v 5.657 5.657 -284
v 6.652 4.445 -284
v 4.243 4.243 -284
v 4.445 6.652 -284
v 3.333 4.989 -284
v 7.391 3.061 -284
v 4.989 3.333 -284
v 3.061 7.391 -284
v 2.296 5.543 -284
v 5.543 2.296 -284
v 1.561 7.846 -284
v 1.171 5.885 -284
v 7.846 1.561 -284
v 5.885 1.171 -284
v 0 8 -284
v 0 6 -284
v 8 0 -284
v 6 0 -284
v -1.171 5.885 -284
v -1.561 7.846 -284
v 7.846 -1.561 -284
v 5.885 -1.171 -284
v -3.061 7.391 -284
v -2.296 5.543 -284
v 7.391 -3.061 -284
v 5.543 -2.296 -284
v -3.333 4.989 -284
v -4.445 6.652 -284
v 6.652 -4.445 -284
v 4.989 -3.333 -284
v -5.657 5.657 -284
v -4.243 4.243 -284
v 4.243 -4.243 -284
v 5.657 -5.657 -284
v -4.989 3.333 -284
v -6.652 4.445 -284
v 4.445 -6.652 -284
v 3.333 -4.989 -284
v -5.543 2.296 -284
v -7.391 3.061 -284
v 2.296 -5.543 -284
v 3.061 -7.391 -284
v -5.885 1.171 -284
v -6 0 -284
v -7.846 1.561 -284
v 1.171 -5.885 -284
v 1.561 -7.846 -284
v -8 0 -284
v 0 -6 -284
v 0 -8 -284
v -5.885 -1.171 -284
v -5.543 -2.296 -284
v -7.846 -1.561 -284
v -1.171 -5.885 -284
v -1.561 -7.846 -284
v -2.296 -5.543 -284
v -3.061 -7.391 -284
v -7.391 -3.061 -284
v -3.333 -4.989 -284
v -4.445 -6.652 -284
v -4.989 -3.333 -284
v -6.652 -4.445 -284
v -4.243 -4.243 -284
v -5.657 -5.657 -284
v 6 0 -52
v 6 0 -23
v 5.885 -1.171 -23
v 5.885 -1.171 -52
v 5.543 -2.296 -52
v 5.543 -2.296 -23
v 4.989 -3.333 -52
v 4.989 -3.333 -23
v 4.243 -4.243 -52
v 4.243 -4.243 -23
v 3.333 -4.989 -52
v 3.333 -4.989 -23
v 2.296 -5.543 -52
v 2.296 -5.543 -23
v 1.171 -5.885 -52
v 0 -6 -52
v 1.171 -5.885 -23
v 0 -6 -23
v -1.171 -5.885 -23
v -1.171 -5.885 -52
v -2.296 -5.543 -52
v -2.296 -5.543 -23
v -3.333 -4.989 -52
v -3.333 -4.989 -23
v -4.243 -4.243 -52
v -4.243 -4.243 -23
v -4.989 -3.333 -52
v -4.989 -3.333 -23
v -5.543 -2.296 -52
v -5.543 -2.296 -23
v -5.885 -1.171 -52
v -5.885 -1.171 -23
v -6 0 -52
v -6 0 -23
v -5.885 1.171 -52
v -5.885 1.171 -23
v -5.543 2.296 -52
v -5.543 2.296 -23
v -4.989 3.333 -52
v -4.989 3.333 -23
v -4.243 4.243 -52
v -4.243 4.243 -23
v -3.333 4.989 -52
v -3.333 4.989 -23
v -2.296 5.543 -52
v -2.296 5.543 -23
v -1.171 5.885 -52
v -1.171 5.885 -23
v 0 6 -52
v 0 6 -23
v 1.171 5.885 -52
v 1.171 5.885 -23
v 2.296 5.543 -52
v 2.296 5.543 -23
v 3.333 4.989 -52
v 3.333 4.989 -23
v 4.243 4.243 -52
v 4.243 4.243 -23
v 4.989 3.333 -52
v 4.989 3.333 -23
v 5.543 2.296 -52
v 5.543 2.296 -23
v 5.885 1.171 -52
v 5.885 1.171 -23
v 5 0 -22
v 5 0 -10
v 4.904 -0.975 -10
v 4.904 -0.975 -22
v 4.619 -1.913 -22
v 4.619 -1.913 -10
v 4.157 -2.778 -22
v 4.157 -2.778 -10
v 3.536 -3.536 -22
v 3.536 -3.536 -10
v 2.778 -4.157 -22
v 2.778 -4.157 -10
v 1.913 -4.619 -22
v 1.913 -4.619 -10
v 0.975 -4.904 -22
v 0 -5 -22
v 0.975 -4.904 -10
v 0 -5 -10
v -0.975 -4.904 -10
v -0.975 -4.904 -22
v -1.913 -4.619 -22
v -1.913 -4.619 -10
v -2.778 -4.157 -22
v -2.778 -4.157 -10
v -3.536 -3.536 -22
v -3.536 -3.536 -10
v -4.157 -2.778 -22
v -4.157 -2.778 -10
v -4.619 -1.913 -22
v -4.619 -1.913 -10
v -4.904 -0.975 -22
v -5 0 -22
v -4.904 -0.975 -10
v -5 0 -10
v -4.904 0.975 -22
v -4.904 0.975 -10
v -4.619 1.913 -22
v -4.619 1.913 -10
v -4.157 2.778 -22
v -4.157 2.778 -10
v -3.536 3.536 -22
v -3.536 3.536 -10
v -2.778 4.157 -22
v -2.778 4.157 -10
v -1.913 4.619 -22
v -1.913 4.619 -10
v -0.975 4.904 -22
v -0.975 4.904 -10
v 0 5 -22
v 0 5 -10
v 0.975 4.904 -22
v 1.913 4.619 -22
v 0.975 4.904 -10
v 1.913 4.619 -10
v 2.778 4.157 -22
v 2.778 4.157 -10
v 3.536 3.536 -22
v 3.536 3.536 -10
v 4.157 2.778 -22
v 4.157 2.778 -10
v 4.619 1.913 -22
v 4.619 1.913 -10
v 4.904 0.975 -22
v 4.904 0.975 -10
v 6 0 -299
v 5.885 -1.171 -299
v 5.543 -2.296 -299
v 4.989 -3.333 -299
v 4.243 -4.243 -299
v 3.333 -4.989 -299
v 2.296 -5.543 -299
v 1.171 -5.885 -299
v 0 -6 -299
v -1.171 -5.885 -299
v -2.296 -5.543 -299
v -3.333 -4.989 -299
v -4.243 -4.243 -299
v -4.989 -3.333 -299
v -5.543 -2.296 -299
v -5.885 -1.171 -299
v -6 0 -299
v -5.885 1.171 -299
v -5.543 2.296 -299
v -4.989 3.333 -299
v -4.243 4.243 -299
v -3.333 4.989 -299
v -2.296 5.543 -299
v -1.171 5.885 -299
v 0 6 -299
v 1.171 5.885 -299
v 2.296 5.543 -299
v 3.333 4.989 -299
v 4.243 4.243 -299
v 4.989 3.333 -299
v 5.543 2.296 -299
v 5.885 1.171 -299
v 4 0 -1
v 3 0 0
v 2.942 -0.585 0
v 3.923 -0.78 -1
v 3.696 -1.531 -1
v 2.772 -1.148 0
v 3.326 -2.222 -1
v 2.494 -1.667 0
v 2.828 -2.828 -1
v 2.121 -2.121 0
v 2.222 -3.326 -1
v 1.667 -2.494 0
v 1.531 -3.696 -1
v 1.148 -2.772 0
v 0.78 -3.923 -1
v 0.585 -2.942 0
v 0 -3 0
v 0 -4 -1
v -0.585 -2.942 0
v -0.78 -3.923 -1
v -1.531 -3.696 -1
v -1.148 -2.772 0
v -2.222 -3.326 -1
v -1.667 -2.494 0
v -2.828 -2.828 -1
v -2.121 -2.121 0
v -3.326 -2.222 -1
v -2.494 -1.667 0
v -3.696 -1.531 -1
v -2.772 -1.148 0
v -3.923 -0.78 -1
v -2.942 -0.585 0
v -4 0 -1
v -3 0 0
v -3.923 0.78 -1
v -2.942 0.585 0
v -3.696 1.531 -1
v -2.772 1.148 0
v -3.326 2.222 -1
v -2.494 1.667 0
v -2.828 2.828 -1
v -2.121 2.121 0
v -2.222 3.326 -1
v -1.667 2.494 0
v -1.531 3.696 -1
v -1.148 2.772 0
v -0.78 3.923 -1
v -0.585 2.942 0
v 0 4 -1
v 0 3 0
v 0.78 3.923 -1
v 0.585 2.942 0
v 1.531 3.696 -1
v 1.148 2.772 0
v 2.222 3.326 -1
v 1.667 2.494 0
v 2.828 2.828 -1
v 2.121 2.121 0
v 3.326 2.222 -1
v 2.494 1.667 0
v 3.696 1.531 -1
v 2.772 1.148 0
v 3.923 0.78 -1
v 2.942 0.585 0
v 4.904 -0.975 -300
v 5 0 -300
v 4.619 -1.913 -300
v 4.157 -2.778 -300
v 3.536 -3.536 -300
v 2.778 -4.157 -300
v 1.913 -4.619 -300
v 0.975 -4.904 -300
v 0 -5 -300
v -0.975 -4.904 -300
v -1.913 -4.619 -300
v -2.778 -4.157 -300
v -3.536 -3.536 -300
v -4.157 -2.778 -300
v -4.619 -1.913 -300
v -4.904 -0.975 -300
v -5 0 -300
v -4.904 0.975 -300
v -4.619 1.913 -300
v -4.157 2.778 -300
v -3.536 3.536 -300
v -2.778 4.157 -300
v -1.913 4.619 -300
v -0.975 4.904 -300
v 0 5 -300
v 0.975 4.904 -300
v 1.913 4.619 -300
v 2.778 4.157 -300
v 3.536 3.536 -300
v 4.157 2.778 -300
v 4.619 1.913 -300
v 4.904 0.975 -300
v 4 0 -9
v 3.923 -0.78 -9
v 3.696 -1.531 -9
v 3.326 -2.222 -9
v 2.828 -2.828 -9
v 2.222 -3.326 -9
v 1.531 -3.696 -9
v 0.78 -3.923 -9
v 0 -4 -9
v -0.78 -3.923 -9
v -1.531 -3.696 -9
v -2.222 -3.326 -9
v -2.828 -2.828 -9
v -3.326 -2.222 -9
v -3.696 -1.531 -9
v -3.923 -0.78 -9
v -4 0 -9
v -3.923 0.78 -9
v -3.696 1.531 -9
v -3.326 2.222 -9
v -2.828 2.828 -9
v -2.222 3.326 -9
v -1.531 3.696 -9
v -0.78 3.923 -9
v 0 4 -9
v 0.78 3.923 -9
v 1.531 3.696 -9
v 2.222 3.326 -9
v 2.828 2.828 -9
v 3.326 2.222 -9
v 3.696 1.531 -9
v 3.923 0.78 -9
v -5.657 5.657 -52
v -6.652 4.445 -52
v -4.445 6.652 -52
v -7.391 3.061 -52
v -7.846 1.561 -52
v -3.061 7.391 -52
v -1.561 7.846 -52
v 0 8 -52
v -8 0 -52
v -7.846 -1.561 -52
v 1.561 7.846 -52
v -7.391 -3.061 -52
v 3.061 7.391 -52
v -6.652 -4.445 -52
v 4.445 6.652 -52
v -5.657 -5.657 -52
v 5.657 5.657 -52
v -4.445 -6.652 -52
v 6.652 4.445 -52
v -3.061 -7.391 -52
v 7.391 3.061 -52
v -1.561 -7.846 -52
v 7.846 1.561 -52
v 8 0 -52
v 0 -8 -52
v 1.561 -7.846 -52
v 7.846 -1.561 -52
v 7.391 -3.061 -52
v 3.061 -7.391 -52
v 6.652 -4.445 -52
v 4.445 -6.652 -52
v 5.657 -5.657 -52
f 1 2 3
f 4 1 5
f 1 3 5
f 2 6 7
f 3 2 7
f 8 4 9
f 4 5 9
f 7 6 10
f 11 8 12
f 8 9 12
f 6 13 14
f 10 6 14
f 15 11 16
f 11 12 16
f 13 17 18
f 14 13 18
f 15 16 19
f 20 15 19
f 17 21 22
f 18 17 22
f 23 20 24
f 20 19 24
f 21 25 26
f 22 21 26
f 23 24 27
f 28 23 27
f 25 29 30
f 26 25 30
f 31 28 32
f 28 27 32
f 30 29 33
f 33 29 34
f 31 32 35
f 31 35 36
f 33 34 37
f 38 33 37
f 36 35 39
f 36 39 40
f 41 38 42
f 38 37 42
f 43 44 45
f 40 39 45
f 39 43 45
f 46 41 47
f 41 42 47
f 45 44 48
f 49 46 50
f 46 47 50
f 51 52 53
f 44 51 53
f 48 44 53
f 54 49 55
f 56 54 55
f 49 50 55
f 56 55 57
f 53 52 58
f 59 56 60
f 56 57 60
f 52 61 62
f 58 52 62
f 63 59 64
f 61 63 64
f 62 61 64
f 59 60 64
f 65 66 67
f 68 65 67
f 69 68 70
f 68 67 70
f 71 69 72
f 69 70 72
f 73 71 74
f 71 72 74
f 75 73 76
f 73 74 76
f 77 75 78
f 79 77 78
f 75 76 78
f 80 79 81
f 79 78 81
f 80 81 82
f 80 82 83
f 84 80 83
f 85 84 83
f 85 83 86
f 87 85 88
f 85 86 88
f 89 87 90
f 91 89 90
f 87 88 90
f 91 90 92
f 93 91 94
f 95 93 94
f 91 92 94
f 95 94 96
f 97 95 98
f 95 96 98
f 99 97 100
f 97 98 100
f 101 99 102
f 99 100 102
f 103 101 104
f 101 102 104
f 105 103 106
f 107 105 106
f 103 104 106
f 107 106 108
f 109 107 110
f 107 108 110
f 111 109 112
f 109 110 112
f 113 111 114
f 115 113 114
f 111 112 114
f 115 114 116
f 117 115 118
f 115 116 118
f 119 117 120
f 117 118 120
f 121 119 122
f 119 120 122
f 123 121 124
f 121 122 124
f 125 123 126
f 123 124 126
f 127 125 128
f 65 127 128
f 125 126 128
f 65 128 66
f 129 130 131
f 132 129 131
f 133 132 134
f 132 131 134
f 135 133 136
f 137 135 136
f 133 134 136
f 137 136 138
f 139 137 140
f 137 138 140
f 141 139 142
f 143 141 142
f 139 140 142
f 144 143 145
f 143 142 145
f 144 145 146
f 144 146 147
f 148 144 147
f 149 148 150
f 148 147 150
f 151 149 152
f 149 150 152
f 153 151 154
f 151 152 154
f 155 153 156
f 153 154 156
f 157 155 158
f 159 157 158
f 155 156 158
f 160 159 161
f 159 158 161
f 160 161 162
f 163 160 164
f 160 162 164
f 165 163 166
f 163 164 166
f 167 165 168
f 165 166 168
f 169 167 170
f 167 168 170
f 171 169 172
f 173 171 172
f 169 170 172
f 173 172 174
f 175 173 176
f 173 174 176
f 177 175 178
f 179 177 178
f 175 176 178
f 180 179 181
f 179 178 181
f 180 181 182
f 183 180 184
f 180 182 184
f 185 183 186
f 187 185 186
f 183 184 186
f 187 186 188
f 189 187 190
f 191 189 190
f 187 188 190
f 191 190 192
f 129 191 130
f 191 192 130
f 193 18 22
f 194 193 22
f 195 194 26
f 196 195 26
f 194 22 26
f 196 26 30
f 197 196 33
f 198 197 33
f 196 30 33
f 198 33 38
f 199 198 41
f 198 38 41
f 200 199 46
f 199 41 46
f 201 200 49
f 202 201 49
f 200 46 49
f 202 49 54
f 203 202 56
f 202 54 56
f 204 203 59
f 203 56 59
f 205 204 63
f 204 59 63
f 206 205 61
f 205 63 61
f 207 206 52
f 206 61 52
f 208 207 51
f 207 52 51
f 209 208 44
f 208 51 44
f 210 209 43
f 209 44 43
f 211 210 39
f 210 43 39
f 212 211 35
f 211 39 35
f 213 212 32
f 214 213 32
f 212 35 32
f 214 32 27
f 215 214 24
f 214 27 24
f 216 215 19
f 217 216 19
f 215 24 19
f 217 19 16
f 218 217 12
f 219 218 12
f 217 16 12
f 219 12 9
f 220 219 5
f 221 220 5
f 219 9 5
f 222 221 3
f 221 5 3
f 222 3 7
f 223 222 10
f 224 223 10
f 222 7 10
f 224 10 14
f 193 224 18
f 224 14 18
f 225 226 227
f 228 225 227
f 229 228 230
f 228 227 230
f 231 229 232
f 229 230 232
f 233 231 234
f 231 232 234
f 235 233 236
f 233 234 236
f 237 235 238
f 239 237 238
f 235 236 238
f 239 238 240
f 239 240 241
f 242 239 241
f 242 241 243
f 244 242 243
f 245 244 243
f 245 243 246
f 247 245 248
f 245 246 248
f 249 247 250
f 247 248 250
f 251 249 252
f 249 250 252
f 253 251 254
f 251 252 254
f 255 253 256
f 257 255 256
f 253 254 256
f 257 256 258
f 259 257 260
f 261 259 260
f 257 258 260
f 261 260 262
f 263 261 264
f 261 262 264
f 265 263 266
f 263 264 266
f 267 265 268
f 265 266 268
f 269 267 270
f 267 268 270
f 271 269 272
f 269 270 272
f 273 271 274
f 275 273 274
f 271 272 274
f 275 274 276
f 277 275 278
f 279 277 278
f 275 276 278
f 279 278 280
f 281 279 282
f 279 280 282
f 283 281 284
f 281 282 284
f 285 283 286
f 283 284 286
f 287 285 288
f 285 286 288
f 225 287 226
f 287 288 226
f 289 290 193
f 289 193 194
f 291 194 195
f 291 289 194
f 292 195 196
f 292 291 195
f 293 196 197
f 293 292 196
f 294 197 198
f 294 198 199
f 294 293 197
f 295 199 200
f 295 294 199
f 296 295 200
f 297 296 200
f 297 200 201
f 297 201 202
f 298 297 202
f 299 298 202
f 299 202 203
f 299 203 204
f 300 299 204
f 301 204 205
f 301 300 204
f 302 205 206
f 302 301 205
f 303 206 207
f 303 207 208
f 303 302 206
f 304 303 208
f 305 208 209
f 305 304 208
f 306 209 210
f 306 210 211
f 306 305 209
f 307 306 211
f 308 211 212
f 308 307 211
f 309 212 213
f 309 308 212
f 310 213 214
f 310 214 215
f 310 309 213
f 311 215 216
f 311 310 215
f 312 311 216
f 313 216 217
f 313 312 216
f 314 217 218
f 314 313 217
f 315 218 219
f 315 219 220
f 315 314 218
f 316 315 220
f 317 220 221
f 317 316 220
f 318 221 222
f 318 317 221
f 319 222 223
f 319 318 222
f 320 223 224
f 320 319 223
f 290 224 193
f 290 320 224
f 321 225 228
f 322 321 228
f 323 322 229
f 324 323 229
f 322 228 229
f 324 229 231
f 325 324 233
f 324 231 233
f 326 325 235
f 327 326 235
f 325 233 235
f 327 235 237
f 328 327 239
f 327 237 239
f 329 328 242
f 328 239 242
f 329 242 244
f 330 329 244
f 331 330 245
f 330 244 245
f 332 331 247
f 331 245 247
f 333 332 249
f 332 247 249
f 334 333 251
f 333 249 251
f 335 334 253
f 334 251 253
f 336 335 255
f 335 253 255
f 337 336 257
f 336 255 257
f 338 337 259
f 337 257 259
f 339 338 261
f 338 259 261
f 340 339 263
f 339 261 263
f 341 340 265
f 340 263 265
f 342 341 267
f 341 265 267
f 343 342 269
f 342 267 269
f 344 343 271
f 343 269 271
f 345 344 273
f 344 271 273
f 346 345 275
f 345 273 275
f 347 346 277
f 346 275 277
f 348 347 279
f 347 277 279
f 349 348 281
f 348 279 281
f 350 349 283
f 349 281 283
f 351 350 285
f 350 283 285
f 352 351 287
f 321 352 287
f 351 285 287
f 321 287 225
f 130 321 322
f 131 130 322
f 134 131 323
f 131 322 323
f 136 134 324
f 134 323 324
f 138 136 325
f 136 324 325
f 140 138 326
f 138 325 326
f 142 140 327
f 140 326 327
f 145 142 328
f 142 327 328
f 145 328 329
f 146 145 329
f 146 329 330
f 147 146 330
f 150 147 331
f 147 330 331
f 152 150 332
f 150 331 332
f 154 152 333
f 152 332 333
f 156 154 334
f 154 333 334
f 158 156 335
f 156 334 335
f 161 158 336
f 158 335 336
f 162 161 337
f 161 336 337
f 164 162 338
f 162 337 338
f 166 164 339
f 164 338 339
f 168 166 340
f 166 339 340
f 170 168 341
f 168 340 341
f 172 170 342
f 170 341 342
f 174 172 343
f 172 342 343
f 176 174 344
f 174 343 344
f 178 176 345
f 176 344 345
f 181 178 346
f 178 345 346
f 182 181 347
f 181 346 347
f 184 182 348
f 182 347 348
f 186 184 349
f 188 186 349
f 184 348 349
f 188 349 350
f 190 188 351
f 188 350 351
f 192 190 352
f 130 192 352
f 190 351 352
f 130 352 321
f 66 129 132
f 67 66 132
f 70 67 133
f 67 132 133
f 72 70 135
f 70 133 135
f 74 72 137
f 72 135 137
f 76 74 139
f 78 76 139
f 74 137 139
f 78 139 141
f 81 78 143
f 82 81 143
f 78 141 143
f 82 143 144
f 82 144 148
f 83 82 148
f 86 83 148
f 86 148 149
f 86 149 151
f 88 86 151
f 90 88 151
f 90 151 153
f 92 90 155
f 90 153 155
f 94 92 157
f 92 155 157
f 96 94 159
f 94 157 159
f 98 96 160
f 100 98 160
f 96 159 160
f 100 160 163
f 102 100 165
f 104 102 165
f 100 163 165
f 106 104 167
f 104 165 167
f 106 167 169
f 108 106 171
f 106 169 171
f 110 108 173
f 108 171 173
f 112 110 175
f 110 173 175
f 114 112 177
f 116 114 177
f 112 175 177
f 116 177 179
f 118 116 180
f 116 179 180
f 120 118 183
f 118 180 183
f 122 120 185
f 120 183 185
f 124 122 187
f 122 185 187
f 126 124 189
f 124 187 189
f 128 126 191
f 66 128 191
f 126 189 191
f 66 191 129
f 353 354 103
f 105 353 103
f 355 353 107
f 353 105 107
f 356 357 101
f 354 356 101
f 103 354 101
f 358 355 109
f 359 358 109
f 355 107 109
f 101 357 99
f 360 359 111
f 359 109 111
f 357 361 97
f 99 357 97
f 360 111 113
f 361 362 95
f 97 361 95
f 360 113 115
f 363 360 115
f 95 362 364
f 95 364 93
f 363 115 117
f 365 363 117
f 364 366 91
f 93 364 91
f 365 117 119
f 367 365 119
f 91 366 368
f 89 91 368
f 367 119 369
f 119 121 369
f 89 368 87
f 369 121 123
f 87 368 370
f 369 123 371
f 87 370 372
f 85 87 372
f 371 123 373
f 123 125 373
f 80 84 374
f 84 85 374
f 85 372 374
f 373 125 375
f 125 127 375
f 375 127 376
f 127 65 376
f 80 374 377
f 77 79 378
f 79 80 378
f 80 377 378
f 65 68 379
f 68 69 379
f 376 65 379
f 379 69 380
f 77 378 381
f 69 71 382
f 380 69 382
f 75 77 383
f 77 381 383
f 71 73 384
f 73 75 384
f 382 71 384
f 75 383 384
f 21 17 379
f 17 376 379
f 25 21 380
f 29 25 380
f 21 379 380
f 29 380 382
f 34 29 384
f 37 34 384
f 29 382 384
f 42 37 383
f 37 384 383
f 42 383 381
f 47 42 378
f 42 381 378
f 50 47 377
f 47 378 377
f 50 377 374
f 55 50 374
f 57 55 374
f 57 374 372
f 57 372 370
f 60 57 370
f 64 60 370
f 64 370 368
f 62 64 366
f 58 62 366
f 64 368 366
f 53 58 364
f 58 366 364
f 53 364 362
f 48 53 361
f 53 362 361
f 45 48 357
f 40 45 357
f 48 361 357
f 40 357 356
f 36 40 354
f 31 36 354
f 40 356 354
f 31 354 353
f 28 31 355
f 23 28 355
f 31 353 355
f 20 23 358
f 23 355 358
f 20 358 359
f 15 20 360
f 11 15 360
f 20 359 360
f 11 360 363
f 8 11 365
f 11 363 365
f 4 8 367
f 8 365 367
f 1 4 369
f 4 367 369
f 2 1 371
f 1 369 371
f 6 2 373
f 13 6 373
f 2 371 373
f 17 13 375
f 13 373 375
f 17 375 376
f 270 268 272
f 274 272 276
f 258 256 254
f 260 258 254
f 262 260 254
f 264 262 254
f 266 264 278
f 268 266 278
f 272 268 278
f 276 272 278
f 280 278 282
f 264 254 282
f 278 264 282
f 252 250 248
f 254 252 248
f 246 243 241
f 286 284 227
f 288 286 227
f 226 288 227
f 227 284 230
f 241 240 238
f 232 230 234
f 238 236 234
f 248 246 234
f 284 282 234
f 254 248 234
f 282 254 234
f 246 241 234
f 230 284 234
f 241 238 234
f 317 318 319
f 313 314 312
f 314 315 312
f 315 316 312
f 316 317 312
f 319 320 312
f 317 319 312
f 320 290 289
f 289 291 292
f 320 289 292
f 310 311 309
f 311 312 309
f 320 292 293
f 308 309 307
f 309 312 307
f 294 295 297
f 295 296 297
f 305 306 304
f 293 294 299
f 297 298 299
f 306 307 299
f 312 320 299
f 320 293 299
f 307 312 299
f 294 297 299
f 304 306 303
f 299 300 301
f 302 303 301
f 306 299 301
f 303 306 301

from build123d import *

# Parameters (mm, degrees)
SFAZOWANIE1_SIZE = 1
SFAZOWANIE2_SIZE = 1


with BuildPart() as part:
    # Szkic1 → Obrót1 (revolve)
    with BuildSketch(Plane(origin=(0, 0, 0), x_dir=(0, 0, -1), z_dir=(1, 0, 0)), mode=Mode.PRIVATE) as obr_t1_sk:
        Polygon((0, 0), (300, 0), (300, 6), (284, 6), (284, 8), (52, 8), (52, 6), (22, 6), (22, 5), (9, 5), (9, 4), (0, 4), align=None)
    revolve(obr_t1_sk.sketch.rotate(Axis((0, 0, 0), (0, 0, -1)), 90), axis=Axis((0, 0, 0), (0, 0, -1)))

    # Sfazowanie1
    sfazowanie1_edges = [part.edges().sort_by_distance(p)[0] for p in [
        (-6, 0, -22),
        (-4, 0, 0),
        (-5, 0, -9),
    ]]
    chamfer(sfazowanie1_edges, length=SFAZOWANIE1_SIZE - 0.0001)  # a hair under: the kernel refuses the full size

    # Sfazowanie2
    sfazowanie2_edges = [part.edges().sort_by_distance(p)[0] for p in [
        (-6, 0, -300),
    ]]
    chamfer(sfazowanie2_edges, length=SFAZOWANIE2_SIZE)


solid = part.part
